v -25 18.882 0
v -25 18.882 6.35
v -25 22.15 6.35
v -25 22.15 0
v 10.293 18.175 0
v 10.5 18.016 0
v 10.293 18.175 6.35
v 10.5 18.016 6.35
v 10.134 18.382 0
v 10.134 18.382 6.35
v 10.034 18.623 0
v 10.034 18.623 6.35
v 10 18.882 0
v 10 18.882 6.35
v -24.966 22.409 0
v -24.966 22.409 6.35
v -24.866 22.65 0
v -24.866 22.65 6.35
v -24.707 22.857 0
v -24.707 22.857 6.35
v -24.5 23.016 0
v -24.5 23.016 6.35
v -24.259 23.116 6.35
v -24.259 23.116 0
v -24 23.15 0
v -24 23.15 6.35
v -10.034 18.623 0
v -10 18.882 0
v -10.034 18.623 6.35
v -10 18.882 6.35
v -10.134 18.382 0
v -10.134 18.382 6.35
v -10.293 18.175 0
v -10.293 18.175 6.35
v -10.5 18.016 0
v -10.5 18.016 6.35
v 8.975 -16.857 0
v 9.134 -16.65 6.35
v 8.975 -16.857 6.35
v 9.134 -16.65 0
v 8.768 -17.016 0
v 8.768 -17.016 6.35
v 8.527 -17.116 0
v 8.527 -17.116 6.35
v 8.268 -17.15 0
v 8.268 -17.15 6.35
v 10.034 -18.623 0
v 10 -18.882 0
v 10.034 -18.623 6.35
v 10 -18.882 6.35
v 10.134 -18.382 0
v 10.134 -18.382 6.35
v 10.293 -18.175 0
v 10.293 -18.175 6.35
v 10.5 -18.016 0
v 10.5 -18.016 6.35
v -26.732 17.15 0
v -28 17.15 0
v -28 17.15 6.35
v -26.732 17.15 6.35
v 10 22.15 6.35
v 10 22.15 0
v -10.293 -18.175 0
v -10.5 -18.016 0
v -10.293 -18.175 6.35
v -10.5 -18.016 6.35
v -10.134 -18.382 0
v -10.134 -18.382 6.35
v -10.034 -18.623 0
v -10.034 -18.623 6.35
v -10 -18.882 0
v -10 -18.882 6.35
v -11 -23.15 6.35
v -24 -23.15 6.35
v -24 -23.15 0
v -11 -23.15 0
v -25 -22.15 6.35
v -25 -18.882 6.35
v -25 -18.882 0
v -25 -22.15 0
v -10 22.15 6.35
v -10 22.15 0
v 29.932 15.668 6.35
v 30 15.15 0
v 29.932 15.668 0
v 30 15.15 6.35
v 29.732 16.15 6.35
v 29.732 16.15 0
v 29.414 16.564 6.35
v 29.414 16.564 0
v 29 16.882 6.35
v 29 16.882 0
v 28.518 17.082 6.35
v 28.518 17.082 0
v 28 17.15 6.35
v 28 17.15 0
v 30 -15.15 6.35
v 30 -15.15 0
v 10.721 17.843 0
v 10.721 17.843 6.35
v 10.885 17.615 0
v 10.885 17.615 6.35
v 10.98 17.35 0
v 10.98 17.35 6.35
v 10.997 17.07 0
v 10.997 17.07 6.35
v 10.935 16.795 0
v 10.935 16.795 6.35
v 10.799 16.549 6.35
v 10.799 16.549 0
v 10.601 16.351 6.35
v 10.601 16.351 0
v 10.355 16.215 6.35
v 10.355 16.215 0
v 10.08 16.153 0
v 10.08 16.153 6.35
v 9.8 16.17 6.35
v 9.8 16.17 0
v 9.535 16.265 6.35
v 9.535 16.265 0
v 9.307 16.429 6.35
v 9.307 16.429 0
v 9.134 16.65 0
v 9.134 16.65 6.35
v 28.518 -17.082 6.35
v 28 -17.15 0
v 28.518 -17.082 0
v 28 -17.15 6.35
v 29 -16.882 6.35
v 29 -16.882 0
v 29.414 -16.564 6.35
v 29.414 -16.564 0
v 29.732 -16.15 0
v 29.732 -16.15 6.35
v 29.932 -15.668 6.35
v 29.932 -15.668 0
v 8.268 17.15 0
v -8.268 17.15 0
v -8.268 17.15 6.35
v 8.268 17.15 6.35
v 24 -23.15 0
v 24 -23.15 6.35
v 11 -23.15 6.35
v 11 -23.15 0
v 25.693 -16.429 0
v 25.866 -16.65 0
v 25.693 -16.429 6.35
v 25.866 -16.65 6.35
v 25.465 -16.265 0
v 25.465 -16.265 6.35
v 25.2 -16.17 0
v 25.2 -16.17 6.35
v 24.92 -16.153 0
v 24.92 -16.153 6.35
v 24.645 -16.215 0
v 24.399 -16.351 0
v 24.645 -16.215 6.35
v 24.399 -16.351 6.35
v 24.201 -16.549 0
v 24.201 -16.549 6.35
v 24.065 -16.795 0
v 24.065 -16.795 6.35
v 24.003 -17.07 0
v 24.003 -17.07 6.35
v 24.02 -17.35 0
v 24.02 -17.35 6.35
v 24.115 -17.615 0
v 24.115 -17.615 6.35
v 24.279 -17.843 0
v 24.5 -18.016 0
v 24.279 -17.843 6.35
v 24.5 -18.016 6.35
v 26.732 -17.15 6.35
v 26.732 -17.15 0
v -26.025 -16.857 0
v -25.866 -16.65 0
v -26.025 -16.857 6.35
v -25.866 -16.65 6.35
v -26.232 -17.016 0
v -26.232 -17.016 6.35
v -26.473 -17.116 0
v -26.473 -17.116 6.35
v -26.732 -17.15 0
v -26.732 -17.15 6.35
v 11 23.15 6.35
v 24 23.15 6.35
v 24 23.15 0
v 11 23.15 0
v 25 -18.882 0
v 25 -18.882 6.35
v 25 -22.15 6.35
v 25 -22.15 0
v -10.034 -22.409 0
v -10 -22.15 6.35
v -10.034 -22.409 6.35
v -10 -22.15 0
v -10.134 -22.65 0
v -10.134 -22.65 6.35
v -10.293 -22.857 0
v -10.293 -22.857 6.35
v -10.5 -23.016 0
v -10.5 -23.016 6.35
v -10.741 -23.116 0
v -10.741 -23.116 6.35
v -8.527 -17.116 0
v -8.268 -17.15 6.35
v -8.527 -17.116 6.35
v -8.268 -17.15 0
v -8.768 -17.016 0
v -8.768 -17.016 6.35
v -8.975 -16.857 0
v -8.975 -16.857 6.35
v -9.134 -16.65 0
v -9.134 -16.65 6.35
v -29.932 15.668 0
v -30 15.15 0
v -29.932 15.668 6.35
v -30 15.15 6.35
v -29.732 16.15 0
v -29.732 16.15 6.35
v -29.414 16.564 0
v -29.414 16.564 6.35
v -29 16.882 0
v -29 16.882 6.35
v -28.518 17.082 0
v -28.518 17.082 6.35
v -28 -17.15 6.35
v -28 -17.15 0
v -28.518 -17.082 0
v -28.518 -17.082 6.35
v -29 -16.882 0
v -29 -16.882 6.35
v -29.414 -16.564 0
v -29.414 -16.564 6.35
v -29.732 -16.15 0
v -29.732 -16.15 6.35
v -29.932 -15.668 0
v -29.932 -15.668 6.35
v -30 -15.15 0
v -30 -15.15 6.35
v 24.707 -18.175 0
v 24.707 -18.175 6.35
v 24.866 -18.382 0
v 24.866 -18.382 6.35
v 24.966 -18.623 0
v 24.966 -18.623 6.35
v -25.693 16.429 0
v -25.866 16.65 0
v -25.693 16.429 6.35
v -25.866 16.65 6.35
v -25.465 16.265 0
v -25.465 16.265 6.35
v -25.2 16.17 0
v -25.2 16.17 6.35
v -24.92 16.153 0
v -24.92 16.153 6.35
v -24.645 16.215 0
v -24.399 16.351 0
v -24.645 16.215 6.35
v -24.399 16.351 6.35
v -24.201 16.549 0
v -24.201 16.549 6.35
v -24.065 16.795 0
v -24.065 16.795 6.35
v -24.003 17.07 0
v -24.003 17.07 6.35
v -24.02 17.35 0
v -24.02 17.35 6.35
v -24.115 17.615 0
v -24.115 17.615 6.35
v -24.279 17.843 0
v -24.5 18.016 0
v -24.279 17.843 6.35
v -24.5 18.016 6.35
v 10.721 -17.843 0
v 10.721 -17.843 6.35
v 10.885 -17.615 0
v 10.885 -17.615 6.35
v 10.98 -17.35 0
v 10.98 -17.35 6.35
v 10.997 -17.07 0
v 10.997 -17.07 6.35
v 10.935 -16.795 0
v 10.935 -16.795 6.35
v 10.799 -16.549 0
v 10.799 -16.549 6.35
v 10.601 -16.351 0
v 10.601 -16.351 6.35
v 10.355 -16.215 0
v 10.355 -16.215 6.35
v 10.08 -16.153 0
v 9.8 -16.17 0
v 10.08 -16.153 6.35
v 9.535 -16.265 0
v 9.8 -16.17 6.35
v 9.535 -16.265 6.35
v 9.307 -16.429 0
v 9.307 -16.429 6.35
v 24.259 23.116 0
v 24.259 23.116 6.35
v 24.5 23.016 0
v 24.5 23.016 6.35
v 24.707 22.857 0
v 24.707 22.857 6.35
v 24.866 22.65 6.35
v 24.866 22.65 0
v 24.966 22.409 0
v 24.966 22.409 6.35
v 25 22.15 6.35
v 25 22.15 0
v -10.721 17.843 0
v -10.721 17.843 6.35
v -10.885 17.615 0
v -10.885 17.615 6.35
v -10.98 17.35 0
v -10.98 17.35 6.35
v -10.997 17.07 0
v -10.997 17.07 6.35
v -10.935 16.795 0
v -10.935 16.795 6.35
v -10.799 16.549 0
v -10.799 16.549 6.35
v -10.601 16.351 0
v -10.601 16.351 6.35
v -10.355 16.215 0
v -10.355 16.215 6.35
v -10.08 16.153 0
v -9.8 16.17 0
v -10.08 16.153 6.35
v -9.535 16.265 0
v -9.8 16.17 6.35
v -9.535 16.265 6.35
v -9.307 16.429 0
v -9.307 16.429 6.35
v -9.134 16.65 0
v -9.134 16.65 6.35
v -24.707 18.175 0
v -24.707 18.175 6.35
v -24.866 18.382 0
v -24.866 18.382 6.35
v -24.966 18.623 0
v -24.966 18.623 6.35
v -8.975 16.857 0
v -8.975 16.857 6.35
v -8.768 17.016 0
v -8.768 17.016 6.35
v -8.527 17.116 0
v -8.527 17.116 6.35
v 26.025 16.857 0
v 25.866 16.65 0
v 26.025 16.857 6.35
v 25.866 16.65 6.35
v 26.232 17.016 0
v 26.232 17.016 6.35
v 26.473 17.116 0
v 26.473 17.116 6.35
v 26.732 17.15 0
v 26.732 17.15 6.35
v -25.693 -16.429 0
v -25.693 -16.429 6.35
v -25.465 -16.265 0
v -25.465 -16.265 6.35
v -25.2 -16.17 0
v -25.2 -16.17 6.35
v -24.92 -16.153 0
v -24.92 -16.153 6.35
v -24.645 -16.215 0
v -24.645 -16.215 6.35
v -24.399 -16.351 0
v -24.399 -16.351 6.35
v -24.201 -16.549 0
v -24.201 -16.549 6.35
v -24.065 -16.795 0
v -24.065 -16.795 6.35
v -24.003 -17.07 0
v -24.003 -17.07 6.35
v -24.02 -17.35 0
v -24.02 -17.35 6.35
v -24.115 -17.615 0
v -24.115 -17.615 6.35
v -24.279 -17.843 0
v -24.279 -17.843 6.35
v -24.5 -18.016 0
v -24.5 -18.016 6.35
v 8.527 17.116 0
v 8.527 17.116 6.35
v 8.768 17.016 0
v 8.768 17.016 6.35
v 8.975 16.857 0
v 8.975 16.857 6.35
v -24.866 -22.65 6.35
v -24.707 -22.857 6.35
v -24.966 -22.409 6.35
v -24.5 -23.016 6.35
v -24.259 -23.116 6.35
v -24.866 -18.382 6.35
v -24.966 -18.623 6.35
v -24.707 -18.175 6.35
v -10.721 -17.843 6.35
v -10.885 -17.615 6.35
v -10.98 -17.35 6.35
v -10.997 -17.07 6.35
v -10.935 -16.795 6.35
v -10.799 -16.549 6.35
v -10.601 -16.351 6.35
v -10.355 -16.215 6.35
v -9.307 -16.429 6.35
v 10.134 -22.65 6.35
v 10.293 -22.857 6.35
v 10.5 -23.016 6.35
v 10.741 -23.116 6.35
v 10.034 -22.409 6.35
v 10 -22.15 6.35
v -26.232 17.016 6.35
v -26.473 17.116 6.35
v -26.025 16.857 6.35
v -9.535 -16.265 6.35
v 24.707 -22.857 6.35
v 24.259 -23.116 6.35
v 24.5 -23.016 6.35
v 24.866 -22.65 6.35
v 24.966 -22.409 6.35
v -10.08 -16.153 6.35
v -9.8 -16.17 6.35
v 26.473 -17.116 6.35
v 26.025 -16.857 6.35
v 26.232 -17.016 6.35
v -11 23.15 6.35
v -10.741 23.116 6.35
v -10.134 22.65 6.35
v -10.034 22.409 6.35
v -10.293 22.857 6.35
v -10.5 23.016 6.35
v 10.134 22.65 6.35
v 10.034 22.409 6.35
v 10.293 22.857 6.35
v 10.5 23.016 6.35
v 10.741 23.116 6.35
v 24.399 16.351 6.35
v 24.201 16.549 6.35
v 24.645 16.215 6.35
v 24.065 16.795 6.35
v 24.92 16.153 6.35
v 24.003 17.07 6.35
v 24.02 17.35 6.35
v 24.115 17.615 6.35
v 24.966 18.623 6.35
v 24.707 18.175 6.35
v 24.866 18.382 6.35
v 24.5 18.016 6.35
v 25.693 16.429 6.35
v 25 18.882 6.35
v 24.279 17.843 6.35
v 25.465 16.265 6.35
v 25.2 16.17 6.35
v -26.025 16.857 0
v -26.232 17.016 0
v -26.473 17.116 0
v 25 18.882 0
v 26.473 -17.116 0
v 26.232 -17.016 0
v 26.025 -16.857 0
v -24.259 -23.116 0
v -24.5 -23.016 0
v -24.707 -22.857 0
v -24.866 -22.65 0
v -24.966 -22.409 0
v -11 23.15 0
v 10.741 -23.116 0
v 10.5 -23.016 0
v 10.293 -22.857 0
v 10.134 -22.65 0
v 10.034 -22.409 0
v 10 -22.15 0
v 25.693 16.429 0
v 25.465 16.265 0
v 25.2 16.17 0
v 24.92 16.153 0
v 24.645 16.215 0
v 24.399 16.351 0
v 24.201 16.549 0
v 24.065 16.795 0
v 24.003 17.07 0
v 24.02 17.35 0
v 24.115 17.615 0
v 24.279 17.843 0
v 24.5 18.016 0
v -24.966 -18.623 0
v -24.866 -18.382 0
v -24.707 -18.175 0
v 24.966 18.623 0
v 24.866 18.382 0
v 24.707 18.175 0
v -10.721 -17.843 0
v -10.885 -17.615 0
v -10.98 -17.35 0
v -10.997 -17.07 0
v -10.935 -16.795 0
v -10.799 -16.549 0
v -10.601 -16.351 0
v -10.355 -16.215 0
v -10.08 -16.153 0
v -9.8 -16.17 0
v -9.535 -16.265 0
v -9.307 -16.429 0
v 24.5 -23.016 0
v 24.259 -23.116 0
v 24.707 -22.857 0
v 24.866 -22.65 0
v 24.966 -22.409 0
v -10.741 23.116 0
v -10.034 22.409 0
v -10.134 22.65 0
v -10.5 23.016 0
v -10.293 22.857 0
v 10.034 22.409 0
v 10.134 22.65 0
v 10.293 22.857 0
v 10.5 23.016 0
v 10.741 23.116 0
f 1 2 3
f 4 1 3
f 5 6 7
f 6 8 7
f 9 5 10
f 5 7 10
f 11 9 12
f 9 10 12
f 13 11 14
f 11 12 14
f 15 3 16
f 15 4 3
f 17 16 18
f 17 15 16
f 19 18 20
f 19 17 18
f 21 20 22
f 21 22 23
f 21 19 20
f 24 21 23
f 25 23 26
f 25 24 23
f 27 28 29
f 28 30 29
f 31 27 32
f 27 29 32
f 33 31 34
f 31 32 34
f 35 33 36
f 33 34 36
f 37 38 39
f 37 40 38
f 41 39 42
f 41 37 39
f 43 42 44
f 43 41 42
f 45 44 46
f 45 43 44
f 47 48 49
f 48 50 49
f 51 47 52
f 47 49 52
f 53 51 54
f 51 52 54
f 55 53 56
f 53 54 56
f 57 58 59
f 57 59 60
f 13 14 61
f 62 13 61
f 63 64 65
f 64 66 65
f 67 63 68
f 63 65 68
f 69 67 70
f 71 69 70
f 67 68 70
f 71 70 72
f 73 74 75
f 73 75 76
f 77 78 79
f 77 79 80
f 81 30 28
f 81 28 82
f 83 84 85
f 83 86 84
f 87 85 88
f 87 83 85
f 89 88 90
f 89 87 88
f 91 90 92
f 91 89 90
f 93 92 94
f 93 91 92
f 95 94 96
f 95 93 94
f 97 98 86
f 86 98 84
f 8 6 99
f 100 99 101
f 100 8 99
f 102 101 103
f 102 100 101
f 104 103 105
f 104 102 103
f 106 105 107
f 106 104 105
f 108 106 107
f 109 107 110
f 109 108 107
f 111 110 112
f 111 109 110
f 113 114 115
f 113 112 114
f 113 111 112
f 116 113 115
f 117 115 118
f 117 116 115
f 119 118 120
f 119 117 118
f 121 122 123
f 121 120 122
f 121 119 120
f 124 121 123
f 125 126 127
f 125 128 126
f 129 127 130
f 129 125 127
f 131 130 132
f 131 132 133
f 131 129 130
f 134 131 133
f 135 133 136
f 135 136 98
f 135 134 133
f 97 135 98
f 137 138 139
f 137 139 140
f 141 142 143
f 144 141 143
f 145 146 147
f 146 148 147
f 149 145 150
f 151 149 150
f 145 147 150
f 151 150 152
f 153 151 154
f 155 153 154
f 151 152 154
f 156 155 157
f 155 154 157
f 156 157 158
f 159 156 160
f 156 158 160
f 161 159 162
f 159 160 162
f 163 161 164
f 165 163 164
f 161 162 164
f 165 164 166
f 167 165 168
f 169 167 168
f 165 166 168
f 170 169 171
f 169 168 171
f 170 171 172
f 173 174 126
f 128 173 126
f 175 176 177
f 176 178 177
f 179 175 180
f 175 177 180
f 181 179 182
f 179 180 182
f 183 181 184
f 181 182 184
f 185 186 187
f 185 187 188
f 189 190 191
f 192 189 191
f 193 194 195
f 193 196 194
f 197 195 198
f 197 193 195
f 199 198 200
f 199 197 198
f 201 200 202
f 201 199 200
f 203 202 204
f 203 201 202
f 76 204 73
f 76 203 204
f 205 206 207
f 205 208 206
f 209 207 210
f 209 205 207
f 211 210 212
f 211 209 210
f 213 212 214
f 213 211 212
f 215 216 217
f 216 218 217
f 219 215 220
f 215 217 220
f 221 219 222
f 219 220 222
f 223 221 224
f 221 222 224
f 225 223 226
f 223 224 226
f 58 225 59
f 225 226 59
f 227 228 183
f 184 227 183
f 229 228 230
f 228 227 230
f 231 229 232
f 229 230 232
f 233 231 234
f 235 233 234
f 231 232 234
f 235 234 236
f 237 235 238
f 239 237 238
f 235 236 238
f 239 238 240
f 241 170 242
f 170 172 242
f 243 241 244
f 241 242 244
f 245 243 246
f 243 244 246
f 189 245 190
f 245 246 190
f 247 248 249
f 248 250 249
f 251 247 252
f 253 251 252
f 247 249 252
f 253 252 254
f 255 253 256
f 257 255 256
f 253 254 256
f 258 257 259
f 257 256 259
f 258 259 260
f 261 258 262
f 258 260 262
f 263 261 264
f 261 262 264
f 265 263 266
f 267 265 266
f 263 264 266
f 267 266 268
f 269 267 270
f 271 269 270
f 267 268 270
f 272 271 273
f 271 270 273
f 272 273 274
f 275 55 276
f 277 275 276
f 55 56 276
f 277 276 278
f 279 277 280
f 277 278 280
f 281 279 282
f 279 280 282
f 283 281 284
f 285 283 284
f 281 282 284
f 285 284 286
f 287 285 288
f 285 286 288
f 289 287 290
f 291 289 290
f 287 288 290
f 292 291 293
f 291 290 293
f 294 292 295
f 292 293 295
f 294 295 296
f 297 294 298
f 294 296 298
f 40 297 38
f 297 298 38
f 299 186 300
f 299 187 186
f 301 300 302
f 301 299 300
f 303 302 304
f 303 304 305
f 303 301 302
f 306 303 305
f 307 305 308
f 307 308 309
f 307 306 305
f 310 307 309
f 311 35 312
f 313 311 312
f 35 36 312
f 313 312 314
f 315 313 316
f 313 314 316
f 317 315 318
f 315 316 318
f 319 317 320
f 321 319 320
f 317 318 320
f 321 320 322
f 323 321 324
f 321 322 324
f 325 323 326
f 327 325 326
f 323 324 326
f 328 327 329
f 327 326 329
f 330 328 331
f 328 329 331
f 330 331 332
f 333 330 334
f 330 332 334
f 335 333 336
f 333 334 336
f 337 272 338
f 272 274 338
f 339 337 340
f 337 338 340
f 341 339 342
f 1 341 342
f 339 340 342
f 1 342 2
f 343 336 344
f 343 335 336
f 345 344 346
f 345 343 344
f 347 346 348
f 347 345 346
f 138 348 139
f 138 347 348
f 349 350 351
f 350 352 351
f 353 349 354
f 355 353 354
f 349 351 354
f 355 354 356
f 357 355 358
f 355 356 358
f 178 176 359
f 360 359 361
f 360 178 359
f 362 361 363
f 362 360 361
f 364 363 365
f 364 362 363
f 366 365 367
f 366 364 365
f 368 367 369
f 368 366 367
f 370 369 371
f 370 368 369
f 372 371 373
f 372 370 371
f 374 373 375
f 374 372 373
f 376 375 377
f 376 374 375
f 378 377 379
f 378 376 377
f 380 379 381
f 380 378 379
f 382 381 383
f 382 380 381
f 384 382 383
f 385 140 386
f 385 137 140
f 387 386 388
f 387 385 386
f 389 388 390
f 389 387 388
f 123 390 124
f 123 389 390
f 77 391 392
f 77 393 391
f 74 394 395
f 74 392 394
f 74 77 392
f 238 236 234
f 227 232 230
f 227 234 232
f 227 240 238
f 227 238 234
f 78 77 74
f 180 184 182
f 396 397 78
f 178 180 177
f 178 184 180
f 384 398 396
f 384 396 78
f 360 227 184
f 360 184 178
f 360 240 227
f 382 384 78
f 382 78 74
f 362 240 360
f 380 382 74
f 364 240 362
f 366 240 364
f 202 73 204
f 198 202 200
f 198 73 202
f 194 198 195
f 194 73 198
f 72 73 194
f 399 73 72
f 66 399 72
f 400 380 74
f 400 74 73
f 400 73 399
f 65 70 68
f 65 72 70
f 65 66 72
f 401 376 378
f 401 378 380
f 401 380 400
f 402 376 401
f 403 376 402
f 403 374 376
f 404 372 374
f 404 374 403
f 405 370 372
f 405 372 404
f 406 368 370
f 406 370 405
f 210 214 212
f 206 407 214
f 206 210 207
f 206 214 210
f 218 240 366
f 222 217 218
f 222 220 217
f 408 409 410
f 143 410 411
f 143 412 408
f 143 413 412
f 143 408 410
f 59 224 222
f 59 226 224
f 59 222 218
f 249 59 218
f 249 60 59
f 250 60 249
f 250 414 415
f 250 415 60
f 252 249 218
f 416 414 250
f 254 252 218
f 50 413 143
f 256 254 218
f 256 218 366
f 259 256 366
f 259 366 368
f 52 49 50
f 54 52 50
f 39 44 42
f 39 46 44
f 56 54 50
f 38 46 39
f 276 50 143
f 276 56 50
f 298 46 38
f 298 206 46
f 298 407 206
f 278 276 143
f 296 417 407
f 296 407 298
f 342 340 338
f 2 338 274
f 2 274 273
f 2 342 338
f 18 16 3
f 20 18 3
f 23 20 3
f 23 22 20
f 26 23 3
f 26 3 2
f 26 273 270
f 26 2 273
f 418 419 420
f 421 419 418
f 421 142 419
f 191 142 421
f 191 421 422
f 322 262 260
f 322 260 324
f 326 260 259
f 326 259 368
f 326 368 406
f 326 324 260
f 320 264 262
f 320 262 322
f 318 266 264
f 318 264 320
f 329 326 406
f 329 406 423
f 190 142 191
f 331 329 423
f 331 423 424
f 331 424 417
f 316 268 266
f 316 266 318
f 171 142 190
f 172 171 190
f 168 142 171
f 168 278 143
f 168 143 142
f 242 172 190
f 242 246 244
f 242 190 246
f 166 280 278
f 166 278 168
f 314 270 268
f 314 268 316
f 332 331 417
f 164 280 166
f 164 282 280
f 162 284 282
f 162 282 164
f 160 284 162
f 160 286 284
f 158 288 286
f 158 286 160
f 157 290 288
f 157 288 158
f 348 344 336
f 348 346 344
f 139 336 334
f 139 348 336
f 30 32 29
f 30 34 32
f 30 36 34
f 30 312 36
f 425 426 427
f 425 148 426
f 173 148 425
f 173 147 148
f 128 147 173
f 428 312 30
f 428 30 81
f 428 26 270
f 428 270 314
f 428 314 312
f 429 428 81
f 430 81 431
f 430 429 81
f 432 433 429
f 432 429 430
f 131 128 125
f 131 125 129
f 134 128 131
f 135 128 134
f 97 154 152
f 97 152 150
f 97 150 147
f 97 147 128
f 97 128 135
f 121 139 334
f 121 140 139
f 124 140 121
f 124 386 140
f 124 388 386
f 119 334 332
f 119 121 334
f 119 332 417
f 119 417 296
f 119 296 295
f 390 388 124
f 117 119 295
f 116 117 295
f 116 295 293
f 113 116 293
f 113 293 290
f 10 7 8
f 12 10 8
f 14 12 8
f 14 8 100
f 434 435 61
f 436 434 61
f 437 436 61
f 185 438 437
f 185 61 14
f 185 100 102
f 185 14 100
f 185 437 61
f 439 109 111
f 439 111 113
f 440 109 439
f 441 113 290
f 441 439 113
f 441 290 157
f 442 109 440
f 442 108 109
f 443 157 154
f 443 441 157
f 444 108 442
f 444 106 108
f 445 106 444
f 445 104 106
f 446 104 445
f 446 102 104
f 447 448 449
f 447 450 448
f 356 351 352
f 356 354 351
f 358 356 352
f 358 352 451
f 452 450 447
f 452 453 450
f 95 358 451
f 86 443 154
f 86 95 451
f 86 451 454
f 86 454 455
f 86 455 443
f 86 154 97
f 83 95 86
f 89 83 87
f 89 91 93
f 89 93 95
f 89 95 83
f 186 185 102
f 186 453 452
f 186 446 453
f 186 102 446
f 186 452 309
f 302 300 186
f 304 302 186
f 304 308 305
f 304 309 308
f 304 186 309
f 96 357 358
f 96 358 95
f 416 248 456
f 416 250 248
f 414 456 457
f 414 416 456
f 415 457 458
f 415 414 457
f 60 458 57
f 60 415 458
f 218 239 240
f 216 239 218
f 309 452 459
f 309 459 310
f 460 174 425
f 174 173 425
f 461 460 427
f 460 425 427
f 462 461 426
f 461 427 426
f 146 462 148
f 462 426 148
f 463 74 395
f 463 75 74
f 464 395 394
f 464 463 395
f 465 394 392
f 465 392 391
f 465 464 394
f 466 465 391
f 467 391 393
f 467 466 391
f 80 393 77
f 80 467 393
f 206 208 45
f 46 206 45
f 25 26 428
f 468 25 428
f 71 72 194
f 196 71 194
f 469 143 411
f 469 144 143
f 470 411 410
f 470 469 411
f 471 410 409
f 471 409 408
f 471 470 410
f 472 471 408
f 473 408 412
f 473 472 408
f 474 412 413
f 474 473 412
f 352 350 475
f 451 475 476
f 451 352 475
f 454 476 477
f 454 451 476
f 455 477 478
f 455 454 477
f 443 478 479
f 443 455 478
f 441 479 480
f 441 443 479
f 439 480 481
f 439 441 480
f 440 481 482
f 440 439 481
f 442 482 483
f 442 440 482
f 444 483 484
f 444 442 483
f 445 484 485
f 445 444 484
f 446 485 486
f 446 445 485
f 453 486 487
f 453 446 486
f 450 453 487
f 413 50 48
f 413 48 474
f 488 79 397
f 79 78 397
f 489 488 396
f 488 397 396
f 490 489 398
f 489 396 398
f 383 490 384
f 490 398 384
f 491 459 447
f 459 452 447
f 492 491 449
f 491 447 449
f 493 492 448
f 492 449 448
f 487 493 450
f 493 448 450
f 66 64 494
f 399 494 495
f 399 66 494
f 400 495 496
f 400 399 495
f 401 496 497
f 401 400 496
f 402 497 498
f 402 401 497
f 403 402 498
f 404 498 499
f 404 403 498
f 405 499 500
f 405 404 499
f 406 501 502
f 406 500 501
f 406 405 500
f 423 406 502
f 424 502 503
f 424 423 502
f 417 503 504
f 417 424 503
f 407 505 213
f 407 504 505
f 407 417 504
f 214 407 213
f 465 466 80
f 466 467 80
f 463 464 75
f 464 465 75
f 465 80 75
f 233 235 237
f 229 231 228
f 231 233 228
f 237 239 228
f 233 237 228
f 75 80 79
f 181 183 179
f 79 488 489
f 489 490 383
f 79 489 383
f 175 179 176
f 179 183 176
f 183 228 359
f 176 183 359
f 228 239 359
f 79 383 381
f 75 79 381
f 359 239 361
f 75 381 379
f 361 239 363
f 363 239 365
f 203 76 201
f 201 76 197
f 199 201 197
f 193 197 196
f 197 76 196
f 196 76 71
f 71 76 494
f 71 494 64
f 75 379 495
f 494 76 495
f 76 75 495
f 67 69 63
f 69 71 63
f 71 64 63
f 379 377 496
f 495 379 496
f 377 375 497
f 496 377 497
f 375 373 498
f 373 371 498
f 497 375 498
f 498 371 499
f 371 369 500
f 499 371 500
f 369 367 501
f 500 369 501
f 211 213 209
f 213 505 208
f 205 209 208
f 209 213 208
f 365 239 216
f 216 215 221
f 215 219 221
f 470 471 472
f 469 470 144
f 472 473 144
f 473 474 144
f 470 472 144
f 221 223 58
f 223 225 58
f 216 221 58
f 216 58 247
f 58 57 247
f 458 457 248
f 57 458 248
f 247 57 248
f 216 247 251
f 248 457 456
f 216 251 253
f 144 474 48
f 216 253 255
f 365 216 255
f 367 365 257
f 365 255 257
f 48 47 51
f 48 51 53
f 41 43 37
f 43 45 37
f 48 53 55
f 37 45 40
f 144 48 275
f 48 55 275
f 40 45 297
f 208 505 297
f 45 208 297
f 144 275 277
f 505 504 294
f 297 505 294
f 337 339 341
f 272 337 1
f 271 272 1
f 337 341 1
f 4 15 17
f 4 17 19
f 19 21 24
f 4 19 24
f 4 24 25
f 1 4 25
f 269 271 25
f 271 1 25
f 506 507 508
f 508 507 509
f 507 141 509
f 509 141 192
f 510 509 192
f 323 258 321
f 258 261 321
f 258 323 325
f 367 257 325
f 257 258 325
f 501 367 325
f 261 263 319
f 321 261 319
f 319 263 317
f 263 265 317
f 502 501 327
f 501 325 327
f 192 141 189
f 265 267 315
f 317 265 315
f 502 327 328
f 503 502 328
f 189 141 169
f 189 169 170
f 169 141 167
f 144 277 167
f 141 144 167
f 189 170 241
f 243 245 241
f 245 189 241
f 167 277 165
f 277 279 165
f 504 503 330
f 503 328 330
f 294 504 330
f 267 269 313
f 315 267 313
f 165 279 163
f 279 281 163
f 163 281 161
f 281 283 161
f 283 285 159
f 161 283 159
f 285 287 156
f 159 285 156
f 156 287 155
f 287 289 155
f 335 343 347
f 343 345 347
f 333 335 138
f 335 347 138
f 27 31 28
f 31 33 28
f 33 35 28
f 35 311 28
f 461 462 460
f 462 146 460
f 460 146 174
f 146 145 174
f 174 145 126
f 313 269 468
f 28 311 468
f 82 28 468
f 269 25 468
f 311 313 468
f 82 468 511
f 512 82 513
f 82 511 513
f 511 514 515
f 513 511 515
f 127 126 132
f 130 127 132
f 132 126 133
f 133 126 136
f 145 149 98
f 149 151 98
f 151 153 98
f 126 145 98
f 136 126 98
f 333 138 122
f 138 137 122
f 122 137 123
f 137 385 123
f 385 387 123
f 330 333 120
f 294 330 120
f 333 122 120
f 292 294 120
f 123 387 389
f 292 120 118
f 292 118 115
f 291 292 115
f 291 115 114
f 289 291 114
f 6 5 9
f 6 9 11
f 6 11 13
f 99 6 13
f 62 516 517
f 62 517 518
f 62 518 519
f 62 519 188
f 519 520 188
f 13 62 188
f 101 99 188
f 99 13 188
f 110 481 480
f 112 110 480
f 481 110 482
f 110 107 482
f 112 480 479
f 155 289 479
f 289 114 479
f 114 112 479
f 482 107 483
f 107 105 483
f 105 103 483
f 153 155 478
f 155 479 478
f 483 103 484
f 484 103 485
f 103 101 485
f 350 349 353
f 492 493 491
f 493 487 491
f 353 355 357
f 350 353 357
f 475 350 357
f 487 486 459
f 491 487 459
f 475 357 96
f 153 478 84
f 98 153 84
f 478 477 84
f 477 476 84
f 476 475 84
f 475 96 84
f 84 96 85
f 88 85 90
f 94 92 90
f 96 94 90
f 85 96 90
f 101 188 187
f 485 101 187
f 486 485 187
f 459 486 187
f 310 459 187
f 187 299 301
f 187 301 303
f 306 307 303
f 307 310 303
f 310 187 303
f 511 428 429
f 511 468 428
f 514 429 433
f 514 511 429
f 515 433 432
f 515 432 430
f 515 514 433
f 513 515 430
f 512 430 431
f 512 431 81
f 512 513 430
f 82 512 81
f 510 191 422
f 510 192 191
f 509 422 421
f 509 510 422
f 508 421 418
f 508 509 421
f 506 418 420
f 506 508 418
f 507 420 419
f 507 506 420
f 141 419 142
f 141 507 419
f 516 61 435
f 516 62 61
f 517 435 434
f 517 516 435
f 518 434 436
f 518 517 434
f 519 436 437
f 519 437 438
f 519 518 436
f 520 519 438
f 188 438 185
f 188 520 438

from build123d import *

# Parameters (mm, degrees)
SKETCH1_W               = 60
SKETCH1_H               = 34.3
BOSS_EXTRUDE1_DEPTH     = 6.35
SKETCH2_W               = 15
SKETCH2_H               = 6
BOSS_EXTRUDE2_DEPTH     = 6.35
SKETCH3_R               = 1
CUT_EXTRUDE1_DEPTH      = 7.35
MIRROR2_COPY_1_SKETCH_W = 15
MIRROR2_COPY_1_SKETCH_H = 6
MIRROR2_COPY_1_DEPTH    = 6.35
MIRROR2_COPY_2_SKETCH_R = 1
MIRROR2_COPY_2_DEPTH    = 7.35
FILLET1_R               = 1
FILLET2_R               = 2


with BuildPart() as part:
    # Sketch1 → Boss-Extrude1 (new body)
    with BuildSketch(Plane.XY):
        Rectangle(SKETCH1_W, SKETCH1_H)
    extrude(amount=BOSS_EXTRUDE1_DEPTH)

    # Sketch2 → Boss-Extrude2 (add)
    with BuildSketch(Plane.XY.offset(6.35)):
        with Locations((-17.5, 20.15)):
            Rectangle(SKETCH2_W, SKETCH2_H)
    boss_extrude2 = extrude(amount=-BOSS_EXTRUDE2_DEPTH)

    # Sketch3 → Cut-Extrude1 (cut, through all)
    with BuildSketch(Plane.XY.offset(6.35)):
        with Locations((-25, 17.15)):
            Circle(SKETCH3_R)
        with Locations((-10, 17.15)):
            Circle(SKETCH3_R)
    cut_extrude1 = extrude(amount=-CUT_EXTRUDE1_DEPTH, mode=Mode.SUBTRACT)

    # Mirror1: Boss-Extrude2, Cut-Extrude1 across plane
    add(boss_extrude2.mirror(Plane(origin=(0, 0, 0), x_dir=(0, 0, 1), z_dir=(1, 0, 0))))
    add(cut_extrude1.mirror(Plane(origin=(0, 0, 0), x_dir=(0, 0, 1), z_dir=(1, 0, 0))), mode=Mode.SUBTRACT)

    # Mirror2: Boss-Extrude2, Cut-Extrude1 across plane
    add(boss_extrude2.mirror(Plane.ZX))
    add(cut_extrude1.mirror(Plane.ZX), mode=Mode.SUBTRACT)

    # Mirror2 copy 1 sketch → Mirror2 copy 1 (add)
    with BuildSketch(Plane(origin=(0, 0, 6.35), x_dir=(-1, 0, 0), z_dir=(0, 0, 1))):
        with Locations((-17.5, 20.15)):
            Rectangle(MIRROR2_COPY_1_SKETCH_W, MIRROR2_COPY_1_SKETCH_H)
    extrude(amount=-MIRROR2_COPY_1_DEPTH)

    # Mirror2 copy 2 sketch → Mirror2 copy 2 (cut, through all)
    with BuildSketch(Plane(origin=(0, 0, 6.35), x_dir=(-1, 0, 0), z_dir=(0, 0, 1))):
        with Locations((-25, 17.15)):
            Circle(MIRROR2_COPY_2_SKETCH_R)
        with Locations((-10, 17.15)):
            Circle(MIRROR2_COPY_2_SKETCH_R)
    extrude(amount=-MIRROR2_COPY_2_DEPTH, mode=Mode.SUBTRACT)

    # Fillet1
    fillet1_edges = [part.edges().sort_by_distance(p)[0] for p in [
        (26, -17.15, 3.175),
        (9, -17.15, 3.175),
        (-10, -23.15, 3.175),
        (-25, -23.15, 3.175),
        (-25, -18.15, 3.175),
        (-10, -18.15, 3.175),
        (-26, -17.15, 3.175),
        (-9, -17.15, 3.175),
        (-25, 23.15, 3.175),
        (-10, 23.15, 3.175),
        (-10, 18.15, 3.175),
        (-25, 18.15, 3.175),
        (-26, 17.15, 3.175),
        (-9, 17.15, 3.175),
        (10, 23.15, 3.175),
        (25, 23.15, 3.175),
        (25, 18.15, 3.175),
        (10, 18.15, 3.175),
        (26, 17.15, 3.175),
        (9, 17.15, 3.175),
        (25, -23.15, 3.175),
        (10, -23.15, 3.175),
        (10, -18.15, 3.175),
        (25, -18.15, 3.175),
    ]]
    fillet(fillet1_edges, radius=FILLET1_R)

    # Fillet2
    fillet2_edges = [part.edges().sort_by_distance(p)[0] for p in [
        (-30, 17.15, 3.175),
        (30, 17.15, 3.175),
        (30, -17.15, 3.175),
        (-30, -17.15, 3.175),
    ]]
    fillet(fillet2_edges, radius=FILLET2_R)


solid = part.part
